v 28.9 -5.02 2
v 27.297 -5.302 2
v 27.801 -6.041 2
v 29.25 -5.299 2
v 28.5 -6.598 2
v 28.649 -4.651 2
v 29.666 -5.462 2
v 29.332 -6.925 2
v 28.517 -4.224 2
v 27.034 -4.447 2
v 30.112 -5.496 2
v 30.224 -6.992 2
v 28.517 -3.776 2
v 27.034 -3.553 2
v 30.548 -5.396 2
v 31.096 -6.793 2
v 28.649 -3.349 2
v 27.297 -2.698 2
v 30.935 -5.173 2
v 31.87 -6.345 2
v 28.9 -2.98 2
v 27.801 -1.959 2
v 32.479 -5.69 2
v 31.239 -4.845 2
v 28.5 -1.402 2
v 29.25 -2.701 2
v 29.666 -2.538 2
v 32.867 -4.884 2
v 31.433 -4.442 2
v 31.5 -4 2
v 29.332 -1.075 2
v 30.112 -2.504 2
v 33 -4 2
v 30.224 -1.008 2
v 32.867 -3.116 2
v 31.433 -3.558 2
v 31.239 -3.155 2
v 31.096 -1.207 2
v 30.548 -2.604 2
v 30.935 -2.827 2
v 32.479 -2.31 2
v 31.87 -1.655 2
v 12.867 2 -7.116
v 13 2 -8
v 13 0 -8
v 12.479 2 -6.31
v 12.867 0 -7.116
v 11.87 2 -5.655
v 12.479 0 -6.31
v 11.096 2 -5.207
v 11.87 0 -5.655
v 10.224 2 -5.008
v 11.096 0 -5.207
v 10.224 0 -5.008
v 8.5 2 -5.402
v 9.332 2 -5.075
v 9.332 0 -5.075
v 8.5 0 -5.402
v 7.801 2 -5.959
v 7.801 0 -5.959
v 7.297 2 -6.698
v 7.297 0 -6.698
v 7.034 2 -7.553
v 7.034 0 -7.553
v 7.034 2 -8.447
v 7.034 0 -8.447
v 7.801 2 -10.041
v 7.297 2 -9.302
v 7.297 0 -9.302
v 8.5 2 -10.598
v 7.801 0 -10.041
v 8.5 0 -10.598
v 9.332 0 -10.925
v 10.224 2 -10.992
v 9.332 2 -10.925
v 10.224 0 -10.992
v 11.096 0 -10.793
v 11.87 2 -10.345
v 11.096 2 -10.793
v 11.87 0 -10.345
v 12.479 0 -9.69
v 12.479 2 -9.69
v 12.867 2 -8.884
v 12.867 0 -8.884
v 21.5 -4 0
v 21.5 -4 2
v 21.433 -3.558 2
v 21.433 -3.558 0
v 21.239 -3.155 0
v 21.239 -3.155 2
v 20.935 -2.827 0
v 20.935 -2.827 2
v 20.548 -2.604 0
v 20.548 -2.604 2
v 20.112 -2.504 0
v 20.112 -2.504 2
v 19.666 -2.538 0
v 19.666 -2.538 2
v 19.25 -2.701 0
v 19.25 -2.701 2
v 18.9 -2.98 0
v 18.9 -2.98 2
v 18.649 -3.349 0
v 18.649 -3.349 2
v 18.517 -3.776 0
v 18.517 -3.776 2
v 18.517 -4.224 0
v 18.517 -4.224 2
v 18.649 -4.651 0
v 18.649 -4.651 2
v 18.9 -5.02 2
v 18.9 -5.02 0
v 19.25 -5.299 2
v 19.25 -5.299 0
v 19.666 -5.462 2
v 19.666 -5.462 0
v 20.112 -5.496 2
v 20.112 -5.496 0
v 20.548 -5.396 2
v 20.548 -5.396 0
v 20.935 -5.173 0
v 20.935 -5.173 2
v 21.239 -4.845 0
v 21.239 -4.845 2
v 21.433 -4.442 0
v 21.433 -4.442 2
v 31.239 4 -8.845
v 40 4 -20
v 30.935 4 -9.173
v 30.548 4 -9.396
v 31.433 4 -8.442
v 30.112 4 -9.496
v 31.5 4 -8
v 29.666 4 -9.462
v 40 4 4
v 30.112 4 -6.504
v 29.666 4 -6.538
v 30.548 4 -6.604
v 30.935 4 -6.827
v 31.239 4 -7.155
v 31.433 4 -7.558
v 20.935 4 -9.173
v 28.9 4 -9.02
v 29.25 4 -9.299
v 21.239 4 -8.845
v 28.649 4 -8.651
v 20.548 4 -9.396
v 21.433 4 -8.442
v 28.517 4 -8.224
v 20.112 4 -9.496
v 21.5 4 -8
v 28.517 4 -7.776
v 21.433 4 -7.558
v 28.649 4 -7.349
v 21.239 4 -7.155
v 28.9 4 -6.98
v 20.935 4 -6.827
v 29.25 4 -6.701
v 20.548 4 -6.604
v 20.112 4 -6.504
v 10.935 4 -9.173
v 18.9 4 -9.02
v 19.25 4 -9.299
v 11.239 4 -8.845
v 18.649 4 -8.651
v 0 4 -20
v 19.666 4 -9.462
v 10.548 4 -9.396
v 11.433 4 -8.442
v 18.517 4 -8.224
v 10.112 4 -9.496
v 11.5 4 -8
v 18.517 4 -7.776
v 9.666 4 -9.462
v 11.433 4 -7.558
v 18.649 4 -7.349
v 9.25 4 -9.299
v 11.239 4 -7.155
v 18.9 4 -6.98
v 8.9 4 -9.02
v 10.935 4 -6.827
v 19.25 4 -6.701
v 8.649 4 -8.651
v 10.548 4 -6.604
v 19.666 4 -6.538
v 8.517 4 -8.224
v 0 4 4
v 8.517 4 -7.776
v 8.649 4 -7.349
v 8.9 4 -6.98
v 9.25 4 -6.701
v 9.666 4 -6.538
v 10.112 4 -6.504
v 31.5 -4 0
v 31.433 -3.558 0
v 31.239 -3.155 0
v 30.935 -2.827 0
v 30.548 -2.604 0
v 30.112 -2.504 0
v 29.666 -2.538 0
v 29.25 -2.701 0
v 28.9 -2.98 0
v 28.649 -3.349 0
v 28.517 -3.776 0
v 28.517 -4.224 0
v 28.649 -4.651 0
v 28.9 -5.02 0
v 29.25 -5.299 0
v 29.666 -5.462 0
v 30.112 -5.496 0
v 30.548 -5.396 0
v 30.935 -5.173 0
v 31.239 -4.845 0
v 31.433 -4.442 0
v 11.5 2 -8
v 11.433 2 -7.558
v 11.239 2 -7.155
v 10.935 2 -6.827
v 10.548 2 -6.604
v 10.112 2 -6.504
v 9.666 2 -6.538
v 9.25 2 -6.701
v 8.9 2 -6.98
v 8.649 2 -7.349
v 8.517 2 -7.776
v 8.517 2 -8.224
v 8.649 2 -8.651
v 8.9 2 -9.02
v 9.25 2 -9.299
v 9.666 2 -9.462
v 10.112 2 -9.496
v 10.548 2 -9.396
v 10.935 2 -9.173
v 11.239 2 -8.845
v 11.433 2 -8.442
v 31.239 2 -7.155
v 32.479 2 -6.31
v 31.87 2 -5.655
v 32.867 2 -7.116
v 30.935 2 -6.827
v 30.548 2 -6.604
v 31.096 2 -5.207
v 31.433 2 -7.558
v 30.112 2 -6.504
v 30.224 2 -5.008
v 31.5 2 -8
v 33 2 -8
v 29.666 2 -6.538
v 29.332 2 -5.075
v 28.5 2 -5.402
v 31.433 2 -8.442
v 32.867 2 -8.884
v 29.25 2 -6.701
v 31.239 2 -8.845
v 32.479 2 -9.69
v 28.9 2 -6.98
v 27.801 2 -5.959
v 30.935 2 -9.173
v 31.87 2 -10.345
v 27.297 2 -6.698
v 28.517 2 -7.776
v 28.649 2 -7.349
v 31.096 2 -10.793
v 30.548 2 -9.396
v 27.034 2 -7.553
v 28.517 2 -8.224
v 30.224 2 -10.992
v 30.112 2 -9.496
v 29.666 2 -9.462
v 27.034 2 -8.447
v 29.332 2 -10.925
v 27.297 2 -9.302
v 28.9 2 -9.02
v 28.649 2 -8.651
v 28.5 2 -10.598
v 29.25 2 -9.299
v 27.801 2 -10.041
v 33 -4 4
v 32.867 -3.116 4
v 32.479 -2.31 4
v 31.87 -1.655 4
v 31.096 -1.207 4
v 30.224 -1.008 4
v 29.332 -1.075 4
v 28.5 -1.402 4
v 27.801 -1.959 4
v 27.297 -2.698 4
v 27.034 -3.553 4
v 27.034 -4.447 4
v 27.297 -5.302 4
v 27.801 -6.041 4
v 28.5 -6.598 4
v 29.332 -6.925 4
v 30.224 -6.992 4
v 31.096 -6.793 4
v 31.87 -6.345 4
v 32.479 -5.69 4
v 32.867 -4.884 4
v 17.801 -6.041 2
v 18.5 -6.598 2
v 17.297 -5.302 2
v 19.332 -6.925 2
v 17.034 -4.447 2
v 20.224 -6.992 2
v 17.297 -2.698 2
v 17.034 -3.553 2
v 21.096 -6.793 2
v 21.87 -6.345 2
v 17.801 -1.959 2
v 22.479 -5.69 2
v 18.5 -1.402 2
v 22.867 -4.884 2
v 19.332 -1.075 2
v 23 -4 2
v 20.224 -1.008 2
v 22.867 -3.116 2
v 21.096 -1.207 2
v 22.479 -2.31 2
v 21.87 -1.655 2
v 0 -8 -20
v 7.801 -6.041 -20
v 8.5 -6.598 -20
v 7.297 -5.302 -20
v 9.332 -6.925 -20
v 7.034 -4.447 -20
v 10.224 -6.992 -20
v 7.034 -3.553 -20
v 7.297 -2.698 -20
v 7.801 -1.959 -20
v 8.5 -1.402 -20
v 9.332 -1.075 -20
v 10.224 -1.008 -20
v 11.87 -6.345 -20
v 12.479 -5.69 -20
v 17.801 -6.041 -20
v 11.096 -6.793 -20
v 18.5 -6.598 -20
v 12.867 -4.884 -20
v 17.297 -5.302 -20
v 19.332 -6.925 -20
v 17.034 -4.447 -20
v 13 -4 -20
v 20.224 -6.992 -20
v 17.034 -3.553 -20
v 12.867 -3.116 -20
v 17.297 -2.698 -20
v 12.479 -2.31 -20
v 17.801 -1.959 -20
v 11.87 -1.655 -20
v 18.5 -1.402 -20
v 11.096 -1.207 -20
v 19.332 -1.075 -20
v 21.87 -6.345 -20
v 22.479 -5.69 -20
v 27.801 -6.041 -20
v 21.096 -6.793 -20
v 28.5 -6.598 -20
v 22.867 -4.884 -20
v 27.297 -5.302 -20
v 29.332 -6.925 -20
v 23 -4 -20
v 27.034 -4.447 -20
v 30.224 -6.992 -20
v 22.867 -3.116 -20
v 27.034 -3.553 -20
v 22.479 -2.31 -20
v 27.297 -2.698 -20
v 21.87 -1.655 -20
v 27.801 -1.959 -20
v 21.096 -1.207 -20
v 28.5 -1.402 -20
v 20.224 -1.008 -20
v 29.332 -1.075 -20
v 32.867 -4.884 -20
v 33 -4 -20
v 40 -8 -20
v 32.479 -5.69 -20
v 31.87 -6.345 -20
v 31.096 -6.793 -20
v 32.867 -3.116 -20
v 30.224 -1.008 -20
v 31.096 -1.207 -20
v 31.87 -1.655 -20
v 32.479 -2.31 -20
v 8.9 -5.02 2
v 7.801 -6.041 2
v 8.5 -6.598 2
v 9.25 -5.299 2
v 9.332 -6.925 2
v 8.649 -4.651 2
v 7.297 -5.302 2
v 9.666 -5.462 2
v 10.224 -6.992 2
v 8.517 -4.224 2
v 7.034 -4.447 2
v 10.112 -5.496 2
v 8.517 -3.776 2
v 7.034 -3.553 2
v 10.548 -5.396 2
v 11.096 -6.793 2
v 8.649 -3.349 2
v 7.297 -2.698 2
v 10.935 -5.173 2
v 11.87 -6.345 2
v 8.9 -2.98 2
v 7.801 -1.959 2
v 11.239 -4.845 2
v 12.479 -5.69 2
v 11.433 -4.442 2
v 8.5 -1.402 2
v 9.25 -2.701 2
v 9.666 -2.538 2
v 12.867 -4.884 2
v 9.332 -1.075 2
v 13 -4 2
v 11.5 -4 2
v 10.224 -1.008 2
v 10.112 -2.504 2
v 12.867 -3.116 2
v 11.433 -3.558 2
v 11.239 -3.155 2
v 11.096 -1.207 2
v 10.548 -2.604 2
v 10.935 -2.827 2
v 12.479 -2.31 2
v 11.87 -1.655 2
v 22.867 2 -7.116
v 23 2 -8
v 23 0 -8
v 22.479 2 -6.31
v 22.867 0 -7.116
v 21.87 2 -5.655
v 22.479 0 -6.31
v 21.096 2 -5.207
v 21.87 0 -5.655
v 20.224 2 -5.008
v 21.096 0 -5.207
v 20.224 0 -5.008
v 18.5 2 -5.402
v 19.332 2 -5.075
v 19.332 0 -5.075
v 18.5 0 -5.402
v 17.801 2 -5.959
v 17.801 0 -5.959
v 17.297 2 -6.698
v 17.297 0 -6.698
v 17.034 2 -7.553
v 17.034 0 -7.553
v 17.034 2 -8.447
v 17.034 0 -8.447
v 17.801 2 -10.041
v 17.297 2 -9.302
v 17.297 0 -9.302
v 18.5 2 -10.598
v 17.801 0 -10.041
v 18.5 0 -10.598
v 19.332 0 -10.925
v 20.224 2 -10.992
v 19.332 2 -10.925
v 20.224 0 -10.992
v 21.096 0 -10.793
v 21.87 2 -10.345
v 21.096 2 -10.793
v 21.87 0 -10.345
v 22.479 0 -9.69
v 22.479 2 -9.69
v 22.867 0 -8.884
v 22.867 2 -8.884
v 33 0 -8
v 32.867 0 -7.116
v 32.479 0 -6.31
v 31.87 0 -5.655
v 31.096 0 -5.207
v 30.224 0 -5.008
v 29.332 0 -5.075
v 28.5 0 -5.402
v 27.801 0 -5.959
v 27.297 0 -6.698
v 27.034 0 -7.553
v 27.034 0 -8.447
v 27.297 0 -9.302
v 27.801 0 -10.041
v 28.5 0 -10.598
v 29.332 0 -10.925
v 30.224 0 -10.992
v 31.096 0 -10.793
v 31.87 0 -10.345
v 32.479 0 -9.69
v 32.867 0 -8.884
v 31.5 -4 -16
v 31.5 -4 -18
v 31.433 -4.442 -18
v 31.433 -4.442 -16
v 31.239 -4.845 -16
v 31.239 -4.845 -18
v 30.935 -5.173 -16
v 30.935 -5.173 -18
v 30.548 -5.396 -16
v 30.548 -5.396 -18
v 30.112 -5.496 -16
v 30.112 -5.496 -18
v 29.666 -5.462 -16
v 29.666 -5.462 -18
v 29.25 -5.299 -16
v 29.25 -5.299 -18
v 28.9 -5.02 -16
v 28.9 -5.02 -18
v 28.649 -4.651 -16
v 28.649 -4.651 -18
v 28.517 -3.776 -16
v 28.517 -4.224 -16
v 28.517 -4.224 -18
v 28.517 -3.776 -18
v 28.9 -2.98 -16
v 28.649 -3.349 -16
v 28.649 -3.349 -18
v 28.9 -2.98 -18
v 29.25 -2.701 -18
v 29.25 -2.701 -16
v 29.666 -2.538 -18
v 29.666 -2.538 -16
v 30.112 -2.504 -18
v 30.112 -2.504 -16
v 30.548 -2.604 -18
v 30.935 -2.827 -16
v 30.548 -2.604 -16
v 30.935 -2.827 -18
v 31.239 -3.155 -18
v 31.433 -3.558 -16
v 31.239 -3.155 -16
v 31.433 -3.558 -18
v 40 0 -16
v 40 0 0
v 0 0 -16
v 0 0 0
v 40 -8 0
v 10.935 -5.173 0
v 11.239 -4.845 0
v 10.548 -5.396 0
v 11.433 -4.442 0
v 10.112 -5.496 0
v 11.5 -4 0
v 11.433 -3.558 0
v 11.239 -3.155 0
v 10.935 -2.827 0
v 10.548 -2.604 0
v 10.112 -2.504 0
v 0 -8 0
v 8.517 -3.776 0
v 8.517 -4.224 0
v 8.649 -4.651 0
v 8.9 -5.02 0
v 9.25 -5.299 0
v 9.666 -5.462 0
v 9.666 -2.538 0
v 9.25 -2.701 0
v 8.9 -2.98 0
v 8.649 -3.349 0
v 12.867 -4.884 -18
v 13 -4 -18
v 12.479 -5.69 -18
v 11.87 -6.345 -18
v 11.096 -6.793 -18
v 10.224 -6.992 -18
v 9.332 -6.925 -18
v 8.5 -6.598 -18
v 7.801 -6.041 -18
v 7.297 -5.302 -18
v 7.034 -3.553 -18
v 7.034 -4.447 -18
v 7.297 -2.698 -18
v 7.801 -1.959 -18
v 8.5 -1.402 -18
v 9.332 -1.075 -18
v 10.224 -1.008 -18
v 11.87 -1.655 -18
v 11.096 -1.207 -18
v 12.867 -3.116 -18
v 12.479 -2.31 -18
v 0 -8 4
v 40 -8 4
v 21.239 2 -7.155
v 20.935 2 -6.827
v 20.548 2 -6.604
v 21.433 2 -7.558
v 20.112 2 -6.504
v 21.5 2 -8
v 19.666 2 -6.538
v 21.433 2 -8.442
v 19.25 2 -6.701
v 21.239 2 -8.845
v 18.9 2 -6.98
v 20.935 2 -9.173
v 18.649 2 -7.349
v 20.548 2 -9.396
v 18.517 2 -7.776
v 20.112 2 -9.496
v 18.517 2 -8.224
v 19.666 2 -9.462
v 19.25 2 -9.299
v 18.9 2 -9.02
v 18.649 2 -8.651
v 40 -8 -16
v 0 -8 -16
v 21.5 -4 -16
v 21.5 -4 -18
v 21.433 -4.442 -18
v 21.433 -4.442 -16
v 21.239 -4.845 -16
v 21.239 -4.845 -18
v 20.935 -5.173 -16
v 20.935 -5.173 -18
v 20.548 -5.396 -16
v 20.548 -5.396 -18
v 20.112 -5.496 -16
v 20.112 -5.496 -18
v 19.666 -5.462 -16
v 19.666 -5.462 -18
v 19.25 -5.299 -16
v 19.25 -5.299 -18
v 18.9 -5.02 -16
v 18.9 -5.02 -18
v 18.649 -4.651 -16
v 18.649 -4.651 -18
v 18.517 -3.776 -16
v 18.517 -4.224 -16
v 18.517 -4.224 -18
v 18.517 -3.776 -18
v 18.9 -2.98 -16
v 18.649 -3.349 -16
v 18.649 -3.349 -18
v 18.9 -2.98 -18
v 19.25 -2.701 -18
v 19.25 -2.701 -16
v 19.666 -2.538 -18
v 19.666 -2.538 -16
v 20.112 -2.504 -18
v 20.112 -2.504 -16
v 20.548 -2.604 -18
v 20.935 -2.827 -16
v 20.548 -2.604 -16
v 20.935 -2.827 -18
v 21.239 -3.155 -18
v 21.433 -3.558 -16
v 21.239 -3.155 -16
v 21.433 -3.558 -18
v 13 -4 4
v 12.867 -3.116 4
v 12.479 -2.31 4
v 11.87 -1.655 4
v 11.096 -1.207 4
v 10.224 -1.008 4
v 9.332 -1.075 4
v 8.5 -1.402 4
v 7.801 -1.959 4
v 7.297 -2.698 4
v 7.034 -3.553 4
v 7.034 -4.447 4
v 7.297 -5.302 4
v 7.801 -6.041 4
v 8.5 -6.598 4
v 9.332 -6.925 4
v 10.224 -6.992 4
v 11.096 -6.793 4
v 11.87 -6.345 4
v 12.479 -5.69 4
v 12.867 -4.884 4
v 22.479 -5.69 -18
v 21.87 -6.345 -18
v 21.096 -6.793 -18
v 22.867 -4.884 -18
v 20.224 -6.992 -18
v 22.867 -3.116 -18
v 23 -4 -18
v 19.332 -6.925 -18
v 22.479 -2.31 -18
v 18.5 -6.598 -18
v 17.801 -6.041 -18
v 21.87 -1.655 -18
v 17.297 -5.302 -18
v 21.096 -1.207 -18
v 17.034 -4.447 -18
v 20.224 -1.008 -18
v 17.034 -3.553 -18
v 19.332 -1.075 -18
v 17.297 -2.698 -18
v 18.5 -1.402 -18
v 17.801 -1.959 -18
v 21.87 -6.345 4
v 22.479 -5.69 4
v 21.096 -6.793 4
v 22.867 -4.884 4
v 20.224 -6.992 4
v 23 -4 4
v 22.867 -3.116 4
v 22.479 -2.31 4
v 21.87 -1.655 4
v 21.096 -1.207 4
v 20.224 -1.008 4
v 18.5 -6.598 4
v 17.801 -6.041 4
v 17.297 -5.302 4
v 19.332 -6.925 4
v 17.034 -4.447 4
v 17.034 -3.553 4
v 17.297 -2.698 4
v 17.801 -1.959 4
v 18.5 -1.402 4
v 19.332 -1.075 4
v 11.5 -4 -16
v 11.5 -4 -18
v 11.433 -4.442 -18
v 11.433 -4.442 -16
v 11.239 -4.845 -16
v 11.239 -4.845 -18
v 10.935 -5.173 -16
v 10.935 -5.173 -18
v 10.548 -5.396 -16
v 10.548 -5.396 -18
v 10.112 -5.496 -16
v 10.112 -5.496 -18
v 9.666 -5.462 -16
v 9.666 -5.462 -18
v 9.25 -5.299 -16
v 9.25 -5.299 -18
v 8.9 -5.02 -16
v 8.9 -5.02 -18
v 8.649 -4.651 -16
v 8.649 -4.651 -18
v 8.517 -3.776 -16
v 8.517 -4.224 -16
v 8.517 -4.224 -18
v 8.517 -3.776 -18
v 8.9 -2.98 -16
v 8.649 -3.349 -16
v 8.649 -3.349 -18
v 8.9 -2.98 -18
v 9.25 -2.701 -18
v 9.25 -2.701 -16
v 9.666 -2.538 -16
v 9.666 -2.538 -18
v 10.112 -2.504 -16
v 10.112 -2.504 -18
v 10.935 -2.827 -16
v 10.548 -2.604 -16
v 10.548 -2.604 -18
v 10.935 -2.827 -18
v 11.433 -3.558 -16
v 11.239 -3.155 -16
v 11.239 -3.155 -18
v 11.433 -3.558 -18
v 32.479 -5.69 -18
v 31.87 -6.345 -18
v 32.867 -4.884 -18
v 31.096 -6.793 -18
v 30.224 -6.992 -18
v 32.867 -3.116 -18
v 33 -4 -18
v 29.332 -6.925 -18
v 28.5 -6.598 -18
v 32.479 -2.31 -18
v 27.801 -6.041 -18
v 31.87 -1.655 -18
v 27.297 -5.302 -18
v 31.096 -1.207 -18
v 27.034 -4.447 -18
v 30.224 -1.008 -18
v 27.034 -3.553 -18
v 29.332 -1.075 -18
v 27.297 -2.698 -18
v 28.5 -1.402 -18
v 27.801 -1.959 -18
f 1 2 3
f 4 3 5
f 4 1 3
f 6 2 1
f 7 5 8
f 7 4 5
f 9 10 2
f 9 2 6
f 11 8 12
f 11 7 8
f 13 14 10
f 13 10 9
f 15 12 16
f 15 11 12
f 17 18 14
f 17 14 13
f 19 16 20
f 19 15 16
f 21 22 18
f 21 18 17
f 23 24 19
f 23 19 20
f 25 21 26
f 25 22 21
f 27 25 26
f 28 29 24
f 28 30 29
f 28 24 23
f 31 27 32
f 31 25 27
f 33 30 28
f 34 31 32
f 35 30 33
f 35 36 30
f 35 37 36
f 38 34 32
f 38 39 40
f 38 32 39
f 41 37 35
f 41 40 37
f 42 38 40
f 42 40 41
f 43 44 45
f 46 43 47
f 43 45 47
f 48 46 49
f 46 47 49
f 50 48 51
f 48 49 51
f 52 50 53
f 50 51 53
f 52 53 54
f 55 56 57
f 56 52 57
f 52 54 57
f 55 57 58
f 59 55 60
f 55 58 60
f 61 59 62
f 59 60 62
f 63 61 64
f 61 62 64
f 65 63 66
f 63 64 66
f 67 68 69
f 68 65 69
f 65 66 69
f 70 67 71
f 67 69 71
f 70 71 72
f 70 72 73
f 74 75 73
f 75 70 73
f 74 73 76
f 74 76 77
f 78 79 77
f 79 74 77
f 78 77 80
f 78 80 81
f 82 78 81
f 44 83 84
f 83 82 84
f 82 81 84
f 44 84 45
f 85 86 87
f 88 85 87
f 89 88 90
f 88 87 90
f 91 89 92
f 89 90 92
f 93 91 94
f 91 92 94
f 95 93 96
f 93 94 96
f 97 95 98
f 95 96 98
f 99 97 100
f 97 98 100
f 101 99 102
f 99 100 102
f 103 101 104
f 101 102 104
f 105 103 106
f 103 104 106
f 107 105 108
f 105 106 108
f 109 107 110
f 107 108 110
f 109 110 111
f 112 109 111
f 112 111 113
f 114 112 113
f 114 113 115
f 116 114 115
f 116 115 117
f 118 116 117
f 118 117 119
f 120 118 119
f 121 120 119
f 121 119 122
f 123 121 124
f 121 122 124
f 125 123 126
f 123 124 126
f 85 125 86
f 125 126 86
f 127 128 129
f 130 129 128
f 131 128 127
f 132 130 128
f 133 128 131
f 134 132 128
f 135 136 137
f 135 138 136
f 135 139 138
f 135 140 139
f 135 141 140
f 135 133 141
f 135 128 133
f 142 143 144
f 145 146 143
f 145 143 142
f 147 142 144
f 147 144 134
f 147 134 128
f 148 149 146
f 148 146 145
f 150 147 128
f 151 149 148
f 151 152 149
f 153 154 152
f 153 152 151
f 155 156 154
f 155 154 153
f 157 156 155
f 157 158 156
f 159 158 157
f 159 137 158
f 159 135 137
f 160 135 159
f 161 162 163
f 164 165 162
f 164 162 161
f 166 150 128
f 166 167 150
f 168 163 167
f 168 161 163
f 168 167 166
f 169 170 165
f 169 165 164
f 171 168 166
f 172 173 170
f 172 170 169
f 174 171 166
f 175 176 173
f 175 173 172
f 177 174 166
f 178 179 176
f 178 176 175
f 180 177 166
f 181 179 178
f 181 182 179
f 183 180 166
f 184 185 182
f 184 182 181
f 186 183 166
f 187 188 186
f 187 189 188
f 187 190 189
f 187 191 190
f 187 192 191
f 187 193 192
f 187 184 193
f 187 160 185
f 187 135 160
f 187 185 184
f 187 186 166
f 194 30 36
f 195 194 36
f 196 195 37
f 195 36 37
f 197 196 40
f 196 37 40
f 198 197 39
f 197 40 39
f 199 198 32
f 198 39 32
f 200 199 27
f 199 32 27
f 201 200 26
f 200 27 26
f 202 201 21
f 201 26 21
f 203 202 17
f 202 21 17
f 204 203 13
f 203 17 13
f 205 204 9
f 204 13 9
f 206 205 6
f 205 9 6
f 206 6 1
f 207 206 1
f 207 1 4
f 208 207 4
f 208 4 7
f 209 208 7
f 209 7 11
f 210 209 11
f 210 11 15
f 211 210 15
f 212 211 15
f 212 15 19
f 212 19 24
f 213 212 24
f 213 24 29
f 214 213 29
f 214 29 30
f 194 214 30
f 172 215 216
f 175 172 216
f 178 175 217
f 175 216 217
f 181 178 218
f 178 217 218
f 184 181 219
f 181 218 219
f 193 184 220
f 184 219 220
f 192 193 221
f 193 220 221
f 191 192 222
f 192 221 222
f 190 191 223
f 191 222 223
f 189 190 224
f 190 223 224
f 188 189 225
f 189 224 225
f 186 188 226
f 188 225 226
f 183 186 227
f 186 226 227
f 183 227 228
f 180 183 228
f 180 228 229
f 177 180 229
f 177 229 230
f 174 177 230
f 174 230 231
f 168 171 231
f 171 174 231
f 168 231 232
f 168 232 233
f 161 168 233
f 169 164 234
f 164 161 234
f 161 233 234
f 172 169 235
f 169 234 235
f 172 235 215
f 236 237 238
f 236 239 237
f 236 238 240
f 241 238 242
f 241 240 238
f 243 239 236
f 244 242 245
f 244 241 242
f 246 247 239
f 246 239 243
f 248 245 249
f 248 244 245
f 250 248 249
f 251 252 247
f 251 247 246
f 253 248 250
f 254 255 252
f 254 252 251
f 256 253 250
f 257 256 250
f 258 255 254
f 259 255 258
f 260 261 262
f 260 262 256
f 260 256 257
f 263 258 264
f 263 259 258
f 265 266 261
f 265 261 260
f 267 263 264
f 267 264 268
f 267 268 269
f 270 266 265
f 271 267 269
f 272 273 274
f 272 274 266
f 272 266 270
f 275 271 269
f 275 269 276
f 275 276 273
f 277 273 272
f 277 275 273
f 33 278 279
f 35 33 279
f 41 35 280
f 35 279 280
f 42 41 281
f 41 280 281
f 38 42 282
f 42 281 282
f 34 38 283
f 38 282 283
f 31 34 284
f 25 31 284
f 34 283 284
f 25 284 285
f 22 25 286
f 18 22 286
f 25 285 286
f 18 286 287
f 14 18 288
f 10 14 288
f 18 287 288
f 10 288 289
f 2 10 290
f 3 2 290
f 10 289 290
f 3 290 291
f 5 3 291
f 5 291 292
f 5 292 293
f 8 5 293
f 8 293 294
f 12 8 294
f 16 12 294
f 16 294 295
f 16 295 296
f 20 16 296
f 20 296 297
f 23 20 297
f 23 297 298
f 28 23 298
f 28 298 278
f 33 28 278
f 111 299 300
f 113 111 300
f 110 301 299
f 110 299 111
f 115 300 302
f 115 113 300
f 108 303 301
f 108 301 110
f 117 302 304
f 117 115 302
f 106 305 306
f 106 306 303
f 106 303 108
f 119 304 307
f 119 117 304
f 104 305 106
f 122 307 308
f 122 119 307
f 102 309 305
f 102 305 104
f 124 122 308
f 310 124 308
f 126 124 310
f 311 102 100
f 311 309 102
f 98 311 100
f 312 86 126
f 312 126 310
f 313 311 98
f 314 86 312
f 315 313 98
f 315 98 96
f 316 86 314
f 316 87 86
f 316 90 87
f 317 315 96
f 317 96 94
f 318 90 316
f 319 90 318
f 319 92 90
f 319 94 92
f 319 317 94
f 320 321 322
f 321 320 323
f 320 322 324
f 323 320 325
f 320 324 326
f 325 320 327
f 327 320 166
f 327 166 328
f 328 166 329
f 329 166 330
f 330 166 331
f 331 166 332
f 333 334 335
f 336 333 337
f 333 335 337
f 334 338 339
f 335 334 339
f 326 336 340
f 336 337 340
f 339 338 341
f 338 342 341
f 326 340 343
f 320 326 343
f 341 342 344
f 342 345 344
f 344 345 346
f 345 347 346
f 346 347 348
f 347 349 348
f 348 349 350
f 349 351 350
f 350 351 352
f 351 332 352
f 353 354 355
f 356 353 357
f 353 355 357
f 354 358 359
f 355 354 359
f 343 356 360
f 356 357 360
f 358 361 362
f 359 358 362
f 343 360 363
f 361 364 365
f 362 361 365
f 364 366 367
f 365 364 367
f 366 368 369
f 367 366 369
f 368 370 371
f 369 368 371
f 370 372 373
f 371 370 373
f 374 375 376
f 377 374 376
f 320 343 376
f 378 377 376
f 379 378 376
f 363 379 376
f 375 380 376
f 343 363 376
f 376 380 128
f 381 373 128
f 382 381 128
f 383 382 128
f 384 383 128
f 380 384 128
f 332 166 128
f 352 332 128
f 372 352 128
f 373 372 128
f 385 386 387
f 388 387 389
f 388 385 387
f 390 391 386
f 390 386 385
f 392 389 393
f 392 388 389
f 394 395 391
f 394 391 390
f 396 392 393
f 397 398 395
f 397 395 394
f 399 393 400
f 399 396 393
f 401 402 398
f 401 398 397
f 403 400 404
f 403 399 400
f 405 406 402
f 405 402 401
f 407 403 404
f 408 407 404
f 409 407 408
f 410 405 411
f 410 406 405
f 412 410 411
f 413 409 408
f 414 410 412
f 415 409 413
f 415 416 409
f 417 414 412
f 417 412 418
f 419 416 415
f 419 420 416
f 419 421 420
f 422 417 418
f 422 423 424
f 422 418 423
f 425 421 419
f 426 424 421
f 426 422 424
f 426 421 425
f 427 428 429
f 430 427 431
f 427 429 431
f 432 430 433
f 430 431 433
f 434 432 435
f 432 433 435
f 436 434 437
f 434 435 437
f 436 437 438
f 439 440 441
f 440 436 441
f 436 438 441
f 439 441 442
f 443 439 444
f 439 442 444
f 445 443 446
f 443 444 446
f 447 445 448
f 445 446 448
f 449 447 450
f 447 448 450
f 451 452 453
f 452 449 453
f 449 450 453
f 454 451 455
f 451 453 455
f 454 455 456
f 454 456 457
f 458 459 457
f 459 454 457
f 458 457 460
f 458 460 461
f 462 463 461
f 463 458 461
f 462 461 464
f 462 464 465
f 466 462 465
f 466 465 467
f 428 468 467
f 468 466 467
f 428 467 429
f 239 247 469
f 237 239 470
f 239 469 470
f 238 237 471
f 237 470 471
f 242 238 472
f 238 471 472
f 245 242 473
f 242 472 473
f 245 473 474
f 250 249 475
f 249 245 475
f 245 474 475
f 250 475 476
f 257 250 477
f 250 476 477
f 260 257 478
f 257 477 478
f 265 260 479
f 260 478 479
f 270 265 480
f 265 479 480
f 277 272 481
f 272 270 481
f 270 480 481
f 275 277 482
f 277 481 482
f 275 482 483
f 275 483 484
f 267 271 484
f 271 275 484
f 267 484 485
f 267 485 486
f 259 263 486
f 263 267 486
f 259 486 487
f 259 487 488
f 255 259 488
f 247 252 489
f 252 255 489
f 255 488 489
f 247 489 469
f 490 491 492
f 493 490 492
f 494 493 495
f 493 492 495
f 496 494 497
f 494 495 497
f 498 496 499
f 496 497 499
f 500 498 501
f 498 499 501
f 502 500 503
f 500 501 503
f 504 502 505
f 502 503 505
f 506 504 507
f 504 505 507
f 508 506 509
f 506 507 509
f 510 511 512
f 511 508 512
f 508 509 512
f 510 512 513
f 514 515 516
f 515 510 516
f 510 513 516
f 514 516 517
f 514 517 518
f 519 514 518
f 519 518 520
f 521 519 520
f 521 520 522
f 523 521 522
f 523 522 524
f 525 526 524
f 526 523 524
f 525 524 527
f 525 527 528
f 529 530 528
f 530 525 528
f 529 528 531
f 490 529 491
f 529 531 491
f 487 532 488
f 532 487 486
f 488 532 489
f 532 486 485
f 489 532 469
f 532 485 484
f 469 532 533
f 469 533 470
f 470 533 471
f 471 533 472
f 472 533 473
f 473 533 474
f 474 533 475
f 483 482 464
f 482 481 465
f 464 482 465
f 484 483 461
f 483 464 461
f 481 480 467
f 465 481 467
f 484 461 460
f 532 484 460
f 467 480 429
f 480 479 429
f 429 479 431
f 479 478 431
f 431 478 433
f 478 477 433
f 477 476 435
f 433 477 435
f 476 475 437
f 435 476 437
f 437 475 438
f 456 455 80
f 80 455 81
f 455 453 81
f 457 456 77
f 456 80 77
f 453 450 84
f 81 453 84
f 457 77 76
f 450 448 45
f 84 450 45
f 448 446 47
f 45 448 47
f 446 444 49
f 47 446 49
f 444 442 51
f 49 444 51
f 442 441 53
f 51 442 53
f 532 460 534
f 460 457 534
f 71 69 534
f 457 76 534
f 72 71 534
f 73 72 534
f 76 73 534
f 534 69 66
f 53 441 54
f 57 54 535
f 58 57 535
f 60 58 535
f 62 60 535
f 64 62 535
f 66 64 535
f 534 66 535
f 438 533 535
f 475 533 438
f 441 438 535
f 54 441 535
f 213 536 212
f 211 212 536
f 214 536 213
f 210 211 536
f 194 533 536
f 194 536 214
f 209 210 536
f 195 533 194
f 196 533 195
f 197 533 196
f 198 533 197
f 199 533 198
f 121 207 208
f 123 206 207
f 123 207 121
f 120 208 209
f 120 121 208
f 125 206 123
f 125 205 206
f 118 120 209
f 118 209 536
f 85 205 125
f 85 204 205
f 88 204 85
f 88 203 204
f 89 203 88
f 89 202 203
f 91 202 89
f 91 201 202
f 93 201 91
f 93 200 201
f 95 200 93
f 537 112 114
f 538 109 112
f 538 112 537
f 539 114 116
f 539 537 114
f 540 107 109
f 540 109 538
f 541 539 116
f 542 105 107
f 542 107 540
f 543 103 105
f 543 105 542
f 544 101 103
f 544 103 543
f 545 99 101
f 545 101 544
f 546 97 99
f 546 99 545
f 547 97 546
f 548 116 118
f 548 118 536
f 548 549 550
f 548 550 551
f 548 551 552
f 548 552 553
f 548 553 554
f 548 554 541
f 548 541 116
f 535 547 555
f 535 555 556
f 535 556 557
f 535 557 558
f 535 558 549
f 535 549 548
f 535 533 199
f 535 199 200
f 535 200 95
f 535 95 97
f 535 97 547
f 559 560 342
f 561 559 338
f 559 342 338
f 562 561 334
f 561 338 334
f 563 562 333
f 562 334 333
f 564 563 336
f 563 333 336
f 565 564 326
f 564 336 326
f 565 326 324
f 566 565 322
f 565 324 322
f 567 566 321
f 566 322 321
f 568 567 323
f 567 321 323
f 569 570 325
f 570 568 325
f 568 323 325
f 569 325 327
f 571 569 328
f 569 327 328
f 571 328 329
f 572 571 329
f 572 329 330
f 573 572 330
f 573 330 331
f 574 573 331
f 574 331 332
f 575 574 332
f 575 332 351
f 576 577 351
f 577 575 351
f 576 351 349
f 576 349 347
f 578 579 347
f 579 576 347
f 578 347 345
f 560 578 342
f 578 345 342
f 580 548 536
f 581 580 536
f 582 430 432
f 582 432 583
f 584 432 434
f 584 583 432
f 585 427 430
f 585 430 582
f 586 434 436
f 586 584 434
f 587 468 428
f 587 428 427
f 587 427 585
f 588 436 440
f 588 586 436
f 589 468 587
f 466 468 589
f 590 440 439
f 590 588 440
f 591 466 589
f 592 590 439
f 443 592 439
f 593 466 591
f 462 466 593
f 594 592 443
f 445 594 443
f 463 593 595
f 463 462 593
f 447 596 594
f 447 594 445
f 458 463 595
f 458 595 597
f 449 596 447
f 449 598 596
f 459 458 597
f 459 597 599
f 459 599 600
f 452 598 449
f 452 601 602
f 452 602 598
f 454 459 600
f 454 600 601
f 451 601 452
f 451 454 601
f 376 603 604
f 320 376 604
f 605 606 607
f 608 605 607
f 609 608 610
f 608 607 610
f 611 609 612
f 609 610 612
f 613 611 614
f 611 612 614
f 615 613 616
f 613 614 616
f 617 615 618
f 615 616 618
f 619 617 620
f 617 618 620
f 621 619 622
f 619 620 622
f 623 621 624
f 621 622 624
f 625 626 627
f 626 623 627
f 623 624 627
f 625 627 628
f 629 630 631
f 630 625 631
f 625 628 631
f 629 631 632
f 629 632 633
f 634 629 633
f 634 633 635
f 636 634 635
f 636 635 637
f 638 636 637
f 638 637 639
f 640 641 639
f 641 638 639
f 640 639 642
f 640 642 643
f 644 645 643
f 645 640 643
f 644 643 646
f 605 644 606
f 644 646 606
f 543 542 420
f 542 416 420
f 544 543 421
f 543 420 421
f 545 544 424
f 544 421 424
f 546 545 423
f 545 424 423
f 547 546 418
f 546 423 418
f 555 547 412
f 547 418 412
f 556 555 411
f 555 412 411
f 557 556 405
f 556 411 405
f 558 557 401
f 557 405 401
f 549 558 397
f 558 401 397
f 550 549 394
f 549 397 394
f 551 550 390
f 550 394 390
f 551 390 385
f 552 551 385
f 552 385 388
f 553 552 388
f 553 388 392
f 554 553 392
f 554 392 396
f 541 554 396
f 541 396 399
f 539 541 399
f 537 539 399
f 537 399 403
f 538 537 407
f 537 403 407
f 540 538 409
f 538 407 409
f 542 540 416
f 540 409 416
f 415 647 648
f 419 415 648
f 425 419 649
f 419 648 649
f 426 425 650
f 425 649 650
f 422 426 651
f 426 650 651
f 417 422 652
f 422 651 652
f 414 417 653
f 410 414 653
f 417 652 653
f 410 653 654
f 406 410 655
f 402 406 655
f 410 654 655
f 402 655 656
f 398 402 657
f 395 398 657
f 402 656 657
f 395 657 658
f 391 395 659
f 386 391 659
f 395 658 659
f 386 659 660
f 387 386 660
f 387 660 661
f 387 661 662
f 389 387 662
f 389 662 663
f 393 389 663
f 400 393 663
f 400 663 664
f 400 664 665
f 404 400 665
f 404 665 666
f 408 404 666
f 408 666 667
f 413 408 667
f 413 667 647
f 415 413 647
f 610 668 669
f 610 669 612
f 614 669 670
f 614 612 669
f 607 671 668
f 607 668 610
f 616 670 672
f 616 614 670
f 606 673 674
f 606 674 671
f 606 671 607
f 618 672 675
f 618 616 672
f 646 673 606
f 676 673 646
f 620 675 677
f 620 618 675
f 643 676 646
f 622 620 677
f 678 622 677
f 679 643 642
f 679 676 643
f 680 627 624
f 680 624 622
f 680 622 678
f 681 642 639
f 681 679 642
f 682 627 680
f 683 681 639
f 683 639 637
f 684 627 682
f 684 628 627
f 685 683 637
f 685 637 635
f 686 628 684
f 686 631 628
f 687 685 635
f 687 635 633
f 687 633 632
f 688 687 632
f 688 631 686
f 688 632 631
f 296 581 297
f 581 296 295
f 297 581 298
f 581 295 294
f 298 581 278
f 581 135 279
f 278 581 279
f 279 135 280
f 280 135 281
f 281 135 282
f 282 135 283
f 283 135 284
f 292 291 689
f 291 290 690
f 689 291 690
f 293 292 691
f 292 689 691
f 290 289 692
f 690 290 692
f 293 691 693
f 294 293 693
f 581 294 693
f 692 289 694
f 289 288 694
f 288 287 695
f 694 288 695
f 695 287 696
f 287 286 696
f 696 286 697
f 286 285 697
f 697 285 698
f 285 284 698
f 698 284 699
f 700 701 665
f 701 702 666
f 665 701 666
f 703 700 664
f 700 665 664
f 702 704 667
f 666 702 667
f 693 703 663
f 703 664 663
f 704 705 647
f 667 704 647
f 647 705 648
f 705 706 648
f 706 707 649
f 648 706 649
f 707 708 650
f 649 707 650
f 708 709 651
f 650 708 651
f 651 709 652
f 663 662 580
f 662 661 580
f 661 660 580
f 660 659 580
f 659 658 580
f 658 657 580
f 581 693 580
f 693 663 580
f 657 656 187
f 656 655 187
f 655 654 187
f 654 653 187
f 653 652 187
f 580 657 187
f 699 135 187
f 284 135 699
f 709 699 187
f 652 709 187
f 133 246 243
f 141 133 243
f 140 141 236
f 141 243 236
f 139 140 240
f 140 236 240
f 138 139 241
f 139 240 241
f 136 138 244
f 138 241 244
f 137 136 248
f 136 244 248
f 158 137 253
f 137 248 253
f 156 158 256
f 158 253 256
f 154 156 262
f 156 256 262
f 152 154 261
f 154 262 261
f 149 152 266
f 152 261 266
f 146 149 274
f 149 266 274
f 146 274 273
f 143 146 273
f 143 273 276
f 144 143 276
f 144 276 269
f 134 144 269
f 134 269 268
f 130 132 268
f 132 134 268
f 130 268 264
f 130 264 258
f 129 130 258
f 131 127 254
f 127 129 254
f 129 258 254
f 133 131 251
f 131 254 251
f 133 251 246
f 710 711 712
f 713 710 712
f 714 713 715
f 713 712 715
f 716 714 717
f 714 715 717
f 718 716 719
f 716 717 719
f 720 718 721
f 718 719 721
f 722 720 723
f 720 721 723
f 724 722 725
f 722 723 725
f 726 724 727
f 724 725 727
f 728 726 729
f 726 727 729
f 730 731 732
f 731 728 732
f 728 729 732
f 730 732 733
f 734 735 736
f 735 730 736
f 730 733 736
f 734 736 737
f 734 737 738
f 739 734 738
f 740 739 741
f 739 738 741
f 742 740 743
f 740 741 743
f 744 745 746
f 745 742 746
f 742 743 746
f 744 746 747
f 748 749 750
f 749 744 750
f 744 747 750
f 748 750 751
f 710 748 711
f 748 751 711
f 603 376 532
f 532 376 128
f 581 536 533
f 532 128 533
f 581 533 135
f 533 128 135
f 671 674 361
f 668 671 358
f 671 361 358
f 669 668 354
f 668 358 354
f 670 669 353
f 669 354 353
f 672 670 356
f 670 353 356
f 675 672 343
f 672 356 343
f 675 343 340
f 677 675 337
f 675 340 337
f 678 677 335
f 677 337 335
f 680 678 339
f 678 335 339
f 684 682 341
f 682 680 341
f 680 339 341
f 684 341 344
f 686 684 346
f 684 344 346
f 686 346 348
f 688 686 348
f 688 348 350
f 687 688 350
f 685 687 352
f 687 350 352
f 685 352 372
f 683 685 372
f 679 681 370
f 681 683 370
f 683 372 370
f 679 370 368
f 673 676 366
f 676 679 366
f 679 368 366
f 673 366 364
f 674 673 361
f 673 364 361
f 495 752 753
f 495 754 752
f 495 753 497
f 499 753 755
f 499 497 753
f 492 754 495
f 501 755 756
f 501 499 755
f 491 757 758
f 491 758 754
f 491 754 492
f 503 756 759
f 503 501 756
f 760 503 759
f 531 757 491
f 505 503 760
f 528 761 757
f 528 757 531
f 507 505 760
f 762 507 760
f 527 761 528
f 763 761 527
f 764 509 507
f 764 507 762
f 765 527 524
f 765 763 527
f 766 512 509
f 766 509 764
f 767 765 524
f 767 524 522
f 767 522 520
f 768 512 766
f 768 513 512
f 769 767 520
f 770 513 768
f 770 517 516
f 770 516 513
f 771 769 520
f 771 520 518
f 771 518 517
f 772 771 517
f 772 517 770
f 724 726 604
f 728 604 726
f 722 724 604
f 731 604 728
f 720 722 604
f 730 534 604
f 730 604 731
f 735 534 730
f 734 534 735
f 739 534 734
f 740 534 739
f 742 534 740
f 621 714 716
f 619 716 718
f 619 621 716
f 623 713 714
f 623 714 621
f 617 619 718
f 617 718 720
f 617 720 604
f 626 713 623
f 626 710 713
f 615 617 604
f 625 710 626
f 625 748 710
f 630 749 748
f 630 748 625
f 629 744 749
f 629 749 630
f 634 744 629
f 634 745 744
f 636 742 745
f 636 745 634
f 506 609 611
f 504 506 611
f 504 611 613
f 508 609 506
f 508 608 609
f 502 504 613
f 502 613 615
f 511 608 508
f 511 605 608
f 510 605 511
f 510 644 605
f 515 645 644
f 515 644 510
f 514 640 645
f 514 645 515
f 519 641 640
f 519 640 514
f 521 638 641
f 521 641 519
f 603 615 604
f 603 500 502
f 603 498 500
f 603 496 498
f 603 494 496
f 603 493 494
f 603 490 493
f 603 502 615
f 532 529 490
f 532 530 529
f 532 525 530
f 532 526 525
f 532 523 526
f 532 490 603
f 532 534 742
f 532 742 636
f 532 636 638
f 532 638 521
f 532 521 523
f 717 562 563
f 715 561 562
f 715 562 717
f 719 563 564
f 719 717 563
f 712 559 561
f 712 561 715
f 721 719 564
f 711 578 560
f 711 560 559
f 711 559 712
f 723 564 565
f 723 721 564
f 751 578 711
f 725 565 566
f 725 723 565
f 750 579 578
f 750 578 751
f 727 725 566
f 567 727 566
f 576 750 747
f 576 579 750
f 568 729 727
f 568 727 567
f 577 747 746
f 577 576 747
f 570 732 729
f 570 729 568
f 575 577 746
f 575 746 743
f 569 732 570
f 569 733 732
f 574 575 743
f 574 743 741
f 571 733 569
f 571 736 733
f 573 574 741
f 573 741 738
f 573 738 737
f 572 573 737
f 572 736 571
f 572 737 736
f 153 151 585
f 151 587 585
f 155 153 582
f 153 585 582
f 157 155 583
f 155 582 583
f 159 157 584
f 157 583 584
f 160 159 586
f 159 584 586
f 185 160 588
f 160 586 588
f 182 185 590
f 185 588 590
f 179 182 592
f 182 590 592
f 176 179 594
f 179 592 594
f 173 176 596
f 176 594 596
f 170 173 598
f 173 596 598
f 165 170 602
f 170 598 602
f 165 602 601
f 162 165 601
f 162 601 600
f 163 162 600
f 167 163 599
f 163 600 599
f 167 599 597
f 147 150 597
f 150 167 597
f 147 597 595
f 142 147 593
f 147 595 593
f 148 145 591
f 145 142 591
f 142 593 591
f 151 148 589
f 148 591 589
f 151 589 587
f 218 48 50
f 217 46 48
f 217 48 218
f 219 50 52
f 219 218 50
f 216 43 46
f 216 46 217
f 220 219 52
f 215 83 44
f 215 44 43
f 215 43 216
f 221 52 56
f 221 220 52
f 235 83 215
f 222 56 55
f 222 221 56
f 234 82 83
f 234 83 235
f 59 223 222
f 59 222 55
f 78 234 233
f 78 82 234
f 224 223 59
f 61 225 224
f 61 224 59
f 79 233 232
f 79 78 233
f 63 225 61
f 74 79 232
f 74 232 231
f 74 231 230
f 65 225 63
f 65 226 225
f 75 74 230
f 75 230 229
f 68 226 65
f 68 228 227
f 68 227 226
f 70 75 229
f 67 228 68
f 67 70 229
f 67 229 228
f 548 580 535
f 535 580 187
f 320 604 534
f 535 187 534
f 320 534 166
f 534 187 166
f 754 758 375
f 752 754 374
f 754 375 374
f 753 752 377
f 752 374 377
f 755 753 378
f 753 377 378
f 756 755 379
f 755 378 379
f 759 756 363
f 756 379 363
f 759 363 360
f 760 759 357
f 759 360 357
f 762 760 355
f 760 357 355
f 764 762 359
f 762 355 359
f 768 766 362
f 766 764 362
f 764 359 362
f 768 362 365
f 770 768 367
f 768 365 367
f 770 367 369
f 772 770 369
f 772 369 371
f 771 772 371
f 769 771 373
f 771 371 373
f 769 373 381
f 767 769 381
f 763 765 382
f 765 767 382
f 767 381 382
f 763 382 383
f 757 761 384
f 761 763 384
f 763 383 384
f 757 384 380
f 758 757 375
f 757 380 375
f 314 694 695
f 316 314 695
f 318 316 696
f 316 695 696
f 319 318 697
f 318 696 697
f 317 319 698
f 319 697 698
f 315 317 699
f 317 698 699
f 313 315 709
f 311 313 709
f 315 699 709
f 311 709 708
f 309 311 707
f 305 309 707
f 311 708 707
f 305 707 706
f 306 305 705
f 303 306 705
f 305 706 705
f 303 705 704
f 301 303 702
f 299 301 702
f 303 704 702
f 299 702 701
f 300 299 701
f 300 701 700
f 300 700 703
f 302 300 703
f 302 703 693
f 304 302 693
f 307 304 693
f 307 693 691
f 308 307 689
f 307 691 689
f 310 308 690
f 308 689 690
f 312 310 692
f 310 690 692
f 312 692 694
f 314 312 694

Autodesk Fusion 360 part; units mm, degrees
sketch "Sketch1" plane through (0, 0, 0) normal (0, 1, 0) x (1, 0, 0)
  line L0 (0, 0) -> (40, 0)
  line L1 (40, 0) -> (40, -16)
  line L2 (40, -16) -> (0, -16)
  line L3 (0, -16) -> (0, 0)
  line L4 (0, -16) -> (40, -16)
  line L5 (40, -16) -> (40, -20)
  line L6 (40, -20) -> (0, -20)
  line L7 (0, -20) -> (0, -16)
  dimension "d1" = 16
  dimension "d2" = 40
  dimension "d3" = 4
extrude "Extrude1" add sketch "Sketch1" along normal blind 4 makes body 1
extrude "Extrude2" add sketch "Sketch1" against normal blind 8 contours L2 L4 L5 L6 L7 bodies 1
sketch "Sketch2" plane through (0, 0, 0) normal (-1, 0, 0) x (0, 0, 1)
  line L0 (20, -8) -> (20, 4)
  line L1 (20, 4) -> (0, 4)
  line L2 (0, 4) -> (0, 0)
  line L3 (0, 0) -> (16, 0)
  line L4 (16, 0) -> (16, -8)
  line L5 (16, -8) -> (20, -8)
sketch "Sketch3" plane through (0, 0, 20) normal (0, 0, 1) x (1, 0, 0)
  line L0 (40, -8) -> (40, 4)
  line L1 (40, 4) -> (0, 4)
  line L2 (0, 4) -> (0, -8)
  line L3 (0, -8) -> (40, -8)
  line L4 (0, -8) -> (40, -8)
  line L5 (0, 4) -> (0, -8)
  line L6 (0, 0) -> (0, -8)
  line L7 (40, 0) -> (40, -8)
  line L8 (40, -4) -> (0, -4)
  line L9 (40, -4) -> (20, -4)
  line L10 (20, -4) -> (0, -4)
  line L11 (0, -4) -> (10, -4)
  line L12 (40, -4) -> (30, -4)
  line L13 (40, -4) -> (20, -4)
  circle A0 centre (20, -4) radius 3
  circle A1 centre (20, -4) radius 1.5
  circle A2 centre (30, -4) radius 3
  circle A3 centre (30, -4) radius 1.5
  circle A4 centre (10, -4) radius 3
  circle A5 centre (10, -4) radius 1.5
  point P0 (40, 0)
  dimension "d8" = 20
  dimension "d9" = 6
  dimension "d10" = 3
  dimension "d11" = 6
  dimension "d12" = 3
  dimension "d13" = 6
  dimension "d14" = 3
extrude "Extrude3" cut sketch "Sketch3" against normal blind 4 contours L8 L9 L12 L13 A3 | L8 L9 L12 L13 A3 bodies 1
extrude "Extrude4" cut sketch "Sketch3" against normal blind 4 contours L8 L9 L10 L13 A1 | L8 L9 L10 L13 A1 bodies 1
extrude "Extrude5" cut sketch "Sketch3" against normal blind 4 contours L8 L10 L11 A5 | L8 L10 L11 A5 bodies 1
extrude "Extrude6" cut sketch "Sketch3" against normal blind 2 contours L8 L9 L12 L13 A2 A3 | L8 L9 L12 L13 A2 A3 | L8 L10 L11 A4 A5 | L8 L10 L11 A4 A5 | L8 L9 L10 L13 A0 A1 | L8 L9 L10 L13 A0 A1 bodies 1
sketch "Sketch4" plane through (0, 0, 0) normal (0, -1, 0) x (1, 0, 0)
  line L0 (40, 16) -> (0, 16)
  line L1 (0, 16) -> (0, 0)
  line L2 (0, 0) -> (40, 0)
  line L3 (40, 0) -> (40, 16)
  line L4 (0, 0) -> (0, 8)
  line L5 (0, 8) -> (40, 8)
  line L6 (0, 8) -> (20, 8)
  line L7 (20, 8) -> (40, 8)
  circle A0 centre (10, 8) radius 3
  circle A1 centre (20, 8) radius 3
  circle A2 centre (30, 8) radius 3
  circle A3 centre (10, 8) radius 1.5
  circle A4 centre (20, 8) radius 1.5
  circle A5 centre (30, 8) radius 1.5
  dimension "d23" = 8
  dimension "d24" = 6
  dimension "d25" = 6
  dimension "d26" = 6
  dimension "d27" = 3
  dimension "d28" = 3
  dimension "d29" = 3
extrude "Extrude7" cut sketch "Sketch4" against normal blind 2 contours L5 L7 A2 A5 | L5 L7 A2 A5 | L5 L6 A0 A3 | L5 L6 A0 A3 | L5 L6 L7 A1 A4 | L5 L6 L7 A1 A4 bodies 1
extrude "Extrude8" cut 3 faces at (30.1453, 0, 7.036) (20.1453, 0, 7.036) (10.5866, 0, 7.6267) along direction (0, 1, 0) blind 30 on bodies 1 bodies 1
mirror "Mirror1" about plane through (0, 0, 0) normal (0, 0, -1) of bodies 1 makes body 2
move_body "Move1" bodies 1 to x (1, 0, 0) y (0, 1, 0) z (0, 0, 1) at (0, 0, -20)
sketch "Sketch5" plane through (0, 0, -4) normal (0, 0, -1) x (-1, 0, 0)
  circle A0 centre (-10, -4) radius 1.5
  circle A1 centre (-20, -4) radius 1.5
  circle A2 centre (-30, -4) radius 1.5
  line L0 (0, 0) -> (-40, 0)
  line L1 (-40, 0) -> (-40, -8)
  line L2 (-40, -8) -> (0, -8)
  line L3 (0, -8) -> (0, 0)
sketch "Sketch6" plane through (0, 0, 0) normal (-1, 0, 0) x (0, 0, 1)
  line L0 (0, -8) -> (0, 4)
  line L1 (0, 4) -> (-20, 4)
  line L2 (-20, 4) -> (-20, 0)
  line L3 (-20, 0) -> (-4, 0)
  line L4 (-4, 0) -> (-4, -8)
  line L5 (-4, -8) -> (0, -8)
  point P0 (-16, 0)
move_body "Move2" bodies 1 to x (1, 0, 0) y (0, 1, 0) z (0, 0, 1) at (0, 0, 4)
combine "Combine1" operation add target body 2 tool bodies 1
equation "d23 = 16 mm / 2"
